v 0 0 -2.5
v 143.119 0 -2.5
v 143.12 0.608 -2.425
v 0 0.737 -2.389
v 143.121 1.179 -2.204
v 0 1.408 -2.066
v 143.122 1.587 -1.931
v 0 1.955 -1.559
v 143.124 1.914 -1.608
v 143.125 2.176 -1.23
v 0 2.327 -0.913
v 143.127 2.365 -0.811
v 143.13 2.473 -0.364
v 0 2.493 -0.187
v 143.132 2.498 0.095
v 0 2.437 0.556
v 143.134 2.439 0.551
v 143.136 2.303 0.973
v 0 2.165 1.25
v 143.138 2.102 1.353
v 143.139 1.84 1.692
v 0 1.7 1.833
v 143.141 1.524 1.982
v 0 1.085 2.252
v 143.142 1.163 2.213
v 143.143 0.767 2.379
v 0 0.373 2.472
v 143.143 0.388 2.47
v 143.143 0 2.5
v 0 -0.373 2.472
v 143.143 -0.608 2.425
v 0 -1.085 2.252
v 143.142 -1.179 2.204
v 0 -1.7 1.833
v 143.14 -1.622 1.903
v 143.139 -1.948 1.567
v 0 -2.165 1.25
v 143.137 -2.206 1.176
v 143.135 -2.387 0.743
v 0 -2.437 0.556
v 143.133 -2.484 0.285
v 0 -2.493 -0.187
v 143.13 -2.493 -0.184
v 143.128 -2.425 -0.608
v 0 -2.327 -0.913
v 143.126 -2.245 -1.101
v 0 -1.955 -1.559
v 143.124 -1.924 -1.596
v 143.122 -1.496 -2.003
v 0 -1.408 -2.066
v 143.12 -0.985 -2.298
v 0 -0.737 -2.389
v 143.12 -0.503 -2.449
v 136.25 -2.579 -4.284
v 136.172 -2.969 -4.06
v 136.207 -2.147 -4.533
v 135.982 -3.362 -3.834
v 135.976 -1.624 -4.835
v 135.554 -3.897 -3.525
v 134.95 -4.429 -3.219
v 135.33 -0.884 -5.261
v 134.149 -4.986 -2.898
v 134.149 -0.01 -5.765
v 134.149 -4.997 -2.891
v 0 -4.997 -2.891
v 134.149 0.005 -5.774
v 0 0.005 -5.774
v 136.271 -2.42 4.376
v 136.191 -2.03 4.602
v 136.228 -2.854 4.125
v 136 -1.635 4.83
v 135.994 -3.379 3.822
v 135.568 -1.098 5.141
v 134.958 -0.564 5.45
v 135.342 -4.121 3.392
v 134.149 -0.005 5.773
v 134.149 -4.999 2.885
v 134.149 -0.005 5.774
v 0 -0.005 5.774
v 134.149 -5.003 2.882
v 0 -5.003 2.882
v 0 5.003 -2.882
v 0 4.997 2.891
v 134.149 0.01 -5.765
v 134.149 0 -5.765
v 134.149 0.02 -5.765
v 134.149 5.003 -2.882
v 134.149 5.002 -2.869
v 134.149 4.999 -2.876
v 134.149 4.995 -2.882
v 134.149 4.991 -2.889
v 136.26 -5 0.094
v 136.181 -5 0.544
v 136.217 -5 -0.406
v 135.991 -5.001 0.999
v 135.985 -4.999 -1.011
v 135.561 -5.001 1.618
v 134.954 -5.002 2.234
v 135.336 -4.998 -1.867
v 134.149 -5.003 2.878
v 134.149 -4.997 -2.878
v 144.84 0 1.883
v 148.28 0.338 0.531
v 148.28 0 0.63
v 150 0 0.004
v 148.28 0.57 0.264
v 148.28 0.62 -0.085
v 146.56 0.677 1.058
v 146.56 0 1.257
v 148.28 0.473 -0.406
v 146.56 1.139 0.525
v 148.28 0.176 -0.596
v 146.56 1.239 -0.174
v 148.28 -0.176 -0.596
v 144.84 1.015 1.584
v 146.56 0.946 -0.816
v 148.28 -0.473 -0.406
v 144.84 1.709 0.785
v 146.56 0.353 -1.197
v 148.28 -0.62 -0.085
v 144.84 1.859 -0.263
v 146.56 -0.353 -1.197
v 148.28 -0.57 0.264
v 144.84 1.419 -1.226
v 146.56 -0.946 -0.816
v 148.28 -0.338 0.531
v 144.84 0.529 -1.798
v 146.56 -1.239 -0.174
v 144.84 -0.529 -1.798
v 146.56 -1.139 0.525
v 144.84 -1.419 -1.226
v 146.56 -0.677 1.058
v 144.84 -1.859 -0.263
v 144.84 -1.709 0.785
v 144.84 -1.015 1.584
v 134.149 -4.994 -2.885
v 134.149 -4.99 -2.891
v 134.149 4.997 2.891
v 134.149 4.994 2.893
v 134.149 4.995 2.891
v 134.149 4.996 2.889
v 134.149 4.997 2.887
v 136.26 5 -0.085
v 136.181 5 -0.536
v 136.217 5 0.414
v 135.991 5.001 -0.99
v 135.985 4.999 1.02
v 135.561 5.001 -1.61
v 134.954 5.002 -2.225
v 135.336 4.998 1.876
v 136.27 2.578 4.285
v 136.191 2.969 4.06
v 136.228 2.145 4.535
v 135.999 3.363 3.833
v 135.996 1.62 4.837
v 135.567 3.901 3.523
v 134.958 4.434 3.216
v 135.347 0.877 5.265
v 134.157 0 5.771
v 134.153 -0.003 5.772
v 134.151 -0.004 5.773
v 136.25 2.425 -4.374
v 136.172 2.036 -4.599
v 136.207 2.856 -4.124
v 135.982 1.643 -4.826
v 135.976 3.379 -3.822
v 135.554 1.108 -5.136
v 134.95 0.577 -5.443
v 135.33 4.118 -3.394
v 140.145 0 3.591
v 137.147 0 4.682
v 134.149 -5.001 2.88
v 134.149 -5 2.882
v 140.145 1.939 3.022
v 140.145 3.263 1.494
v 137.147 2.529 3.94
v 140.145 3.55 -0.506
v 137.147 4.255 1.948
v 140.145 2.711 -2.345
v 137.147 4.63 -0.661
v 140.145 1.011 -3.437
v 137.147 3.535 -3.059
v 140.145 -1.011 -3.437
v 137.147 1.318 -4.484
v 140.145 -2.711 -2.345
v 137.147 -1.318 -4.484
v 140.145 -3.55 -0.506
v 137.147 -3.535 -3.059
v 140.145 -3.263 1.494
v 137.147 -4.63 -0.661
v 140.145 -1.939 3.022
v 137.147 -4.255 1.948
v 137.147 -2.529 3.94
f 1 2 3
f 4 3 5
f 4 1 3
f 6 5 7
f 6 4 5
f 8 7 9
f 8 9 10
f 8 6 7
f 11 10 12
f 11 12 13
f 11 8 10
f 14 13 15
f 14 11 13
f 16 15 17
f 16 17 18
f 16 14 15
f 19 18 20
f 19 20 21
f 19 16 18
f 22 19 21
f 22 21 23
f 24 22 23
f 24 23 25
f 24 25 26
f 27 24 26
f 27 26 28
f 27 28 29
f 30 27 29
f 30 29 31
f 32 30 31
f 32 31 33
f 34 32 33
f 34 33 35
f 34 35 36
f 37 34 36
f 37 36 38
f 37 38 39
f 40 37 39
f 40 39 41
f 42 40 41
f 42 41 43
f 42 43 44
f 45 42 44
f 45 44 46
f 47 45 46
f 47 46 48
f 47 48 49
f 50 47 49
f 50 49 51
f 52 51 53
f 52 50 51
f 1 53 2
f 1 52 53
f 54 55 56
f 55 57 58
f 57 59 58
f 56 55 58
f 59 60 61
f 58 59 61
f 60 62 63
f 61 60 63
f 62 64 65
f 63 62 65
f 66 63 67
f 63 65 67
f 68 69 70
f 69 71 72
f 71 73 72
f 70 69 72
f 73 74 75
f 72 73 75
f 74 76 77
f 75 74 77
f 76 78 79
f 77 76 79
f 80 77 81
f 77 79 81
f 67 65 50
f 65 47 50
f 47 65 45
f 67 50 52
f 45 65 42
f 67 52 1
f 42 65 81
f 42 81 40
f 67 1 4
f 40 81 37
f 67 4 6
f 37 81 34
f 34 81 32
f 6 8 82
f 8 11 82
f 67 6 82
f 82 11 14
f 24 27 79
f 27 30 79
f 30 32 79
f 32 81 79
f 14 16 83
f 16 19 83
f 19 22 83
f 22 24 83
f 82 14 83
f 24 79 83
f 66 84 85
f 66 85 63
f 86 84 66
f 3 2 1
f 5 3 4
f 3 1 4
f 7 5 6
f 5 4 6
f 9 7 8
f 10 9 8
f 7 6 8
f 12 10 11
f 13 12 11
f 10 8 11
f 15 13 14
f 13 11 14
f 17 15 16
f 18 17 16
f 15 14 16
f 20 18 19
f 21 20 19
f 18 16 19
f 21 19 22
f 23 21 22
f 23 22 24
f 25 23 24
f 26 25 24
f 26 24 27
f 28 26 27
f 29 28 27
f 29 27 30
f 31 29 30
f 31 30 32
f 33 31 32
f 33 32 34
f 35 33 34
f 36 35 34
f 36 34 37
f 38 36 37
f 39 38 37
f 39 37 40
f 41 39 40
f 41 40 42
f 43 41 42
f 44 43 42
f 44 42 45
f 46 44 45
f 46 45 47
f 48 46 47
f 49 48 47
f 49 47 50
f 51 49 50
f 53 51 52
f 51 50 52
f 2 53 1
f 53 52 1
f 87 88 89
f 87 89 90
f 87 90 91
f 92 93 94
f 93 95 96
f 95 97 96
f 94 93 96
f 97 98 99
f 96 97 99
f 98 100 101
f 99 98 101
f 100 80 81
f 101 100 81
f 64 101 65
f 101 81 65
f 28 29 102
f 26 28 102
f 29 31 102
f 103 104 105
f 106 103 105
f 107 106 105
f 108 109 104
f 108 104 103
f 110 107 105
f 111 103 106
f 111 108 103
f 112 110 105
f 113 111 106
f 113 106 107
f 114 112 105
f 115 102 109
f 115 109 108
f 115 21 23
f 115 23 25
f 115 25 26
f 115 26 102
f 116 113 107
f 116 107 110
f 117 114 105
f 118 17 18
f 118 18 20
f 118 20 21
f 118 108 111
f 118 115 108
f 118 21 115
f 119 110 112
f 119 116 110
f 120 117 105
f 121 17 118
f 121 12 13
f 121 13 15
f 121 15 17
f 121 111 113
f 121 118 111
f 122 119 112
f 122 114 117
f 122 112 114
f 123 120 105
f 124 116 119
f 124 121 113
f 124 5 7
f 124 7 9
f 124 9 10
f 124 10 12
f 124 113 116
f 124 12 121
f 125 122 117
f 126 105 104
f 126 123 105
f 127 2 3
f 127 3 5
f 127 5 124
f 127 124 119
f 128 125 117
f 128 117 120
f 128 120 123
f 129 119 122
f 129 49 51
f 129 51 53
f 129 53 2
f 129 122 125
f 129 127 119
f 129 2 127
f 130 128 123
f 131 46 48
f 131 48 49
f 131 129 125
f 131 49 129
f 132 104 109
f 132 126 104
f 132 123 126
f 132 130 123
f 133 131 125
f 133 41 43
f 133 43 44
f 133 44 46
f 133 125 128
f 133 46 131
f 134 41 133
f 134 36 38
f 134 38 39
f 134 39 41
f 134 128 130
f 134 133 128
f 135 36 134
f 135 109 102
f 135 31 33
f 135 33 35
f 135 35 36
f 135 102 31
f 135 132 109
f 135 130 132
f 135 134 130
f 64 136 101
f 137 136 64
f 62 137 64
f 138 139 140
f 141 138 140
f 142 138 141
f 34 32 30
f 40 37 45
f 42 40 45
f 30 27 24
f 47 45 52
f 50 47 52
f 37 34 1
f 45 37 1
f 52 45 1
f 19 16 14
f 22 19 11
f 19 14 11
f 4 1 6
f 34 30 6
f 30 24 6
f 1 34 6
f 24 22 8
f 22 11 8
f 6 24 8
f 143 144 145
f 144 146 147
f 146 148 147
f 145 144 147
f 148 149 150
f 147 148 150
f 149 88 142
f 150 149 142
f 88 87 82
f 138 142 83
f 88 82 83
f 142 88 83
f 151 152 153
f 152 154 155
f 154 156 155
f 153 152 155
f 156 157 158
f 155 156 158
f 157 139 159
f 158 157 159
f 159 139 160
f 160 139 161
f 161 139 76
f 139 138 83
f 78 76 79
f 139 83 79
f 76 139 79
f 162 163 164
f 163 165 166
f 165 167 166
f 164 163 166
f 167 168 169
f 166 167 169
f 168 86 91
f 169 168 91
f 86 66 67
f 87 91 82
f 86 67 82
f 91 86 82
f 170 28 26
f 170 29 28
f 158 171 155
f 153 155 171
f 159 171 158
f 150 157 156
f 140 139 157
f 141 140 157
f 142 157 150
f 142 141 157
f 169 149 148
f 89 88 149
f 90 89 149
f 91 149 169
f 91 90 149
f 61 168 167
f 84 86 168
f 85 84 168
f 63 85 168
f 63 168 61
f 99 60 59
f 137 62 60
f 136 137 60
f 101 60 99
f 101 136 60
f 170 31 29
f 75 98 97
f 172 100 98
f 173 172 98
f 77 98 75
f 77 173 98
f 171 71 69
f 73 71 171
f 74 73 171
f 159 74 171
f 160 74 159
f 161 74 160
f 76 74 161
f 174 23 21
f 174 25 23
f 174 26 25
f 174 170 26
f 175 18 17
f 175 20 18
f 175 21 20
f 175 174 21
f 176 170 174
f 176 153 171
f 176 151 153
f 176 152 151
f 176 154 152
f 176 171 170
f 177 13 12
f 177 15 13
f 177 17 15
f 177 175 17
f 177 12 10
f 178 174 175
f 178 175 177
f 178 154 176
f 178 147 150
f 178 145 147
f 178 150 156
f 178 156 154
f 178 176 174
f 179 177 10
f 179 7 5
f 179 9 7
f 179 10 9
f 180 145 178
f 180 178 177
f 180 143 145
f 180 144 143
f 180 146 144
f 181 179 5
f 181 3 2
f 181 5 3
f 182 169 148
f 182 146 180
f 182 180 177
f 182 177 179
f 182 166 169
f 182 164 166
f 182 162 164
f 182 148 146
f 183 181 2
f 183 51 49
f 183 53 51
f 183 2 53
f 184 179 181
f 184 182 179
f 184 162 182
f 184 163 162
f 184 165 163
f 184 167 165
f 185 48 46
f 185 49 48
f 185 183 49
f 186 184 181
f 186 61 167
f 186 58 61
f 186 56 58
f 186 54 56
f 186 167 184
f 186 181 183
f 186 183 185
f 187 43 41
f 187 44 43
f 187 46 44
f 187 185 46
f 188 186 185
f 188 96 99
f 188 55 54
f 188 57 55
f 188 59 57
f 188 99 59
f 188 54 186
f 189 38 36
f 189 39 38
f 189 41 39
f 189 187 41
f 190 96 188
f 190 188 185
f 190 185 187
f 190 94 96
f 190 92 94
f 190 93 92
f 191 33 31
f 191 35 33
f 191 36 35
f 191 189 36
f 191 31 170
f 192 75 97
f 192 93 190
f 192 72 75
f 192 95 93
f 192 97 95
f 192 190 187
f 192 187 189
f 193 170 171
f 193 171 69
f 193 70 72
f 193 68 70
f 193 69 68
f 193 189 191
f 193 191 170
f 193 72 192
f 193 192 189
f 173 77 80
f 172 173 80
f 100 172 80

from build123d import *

# Parameters (mm, degrees)
SKETCH1_R           = 2.5
BOSS_EXTRUDE1_DEPTH = 150
SKETCH2_R           = 2.5
BOSS_EXTRUDE2_DEPTH = 150


with BuildPart() as part:
    # Sketch1 → Boss-Extrude1 (new body)
    with BuildSketch(Plane.YZ):
        Polygon((5.002510393, -2.882398845), (4.99748582, 2.89110166), (-0.005024572, 5.773500505), (-5.002510393, 2.882398845), (-4.99748582, -2.89110166), (0.005024572, -5.773500505), align=None)
        with Locations(Location((0, 0, 0), (0, 0, 270))):
            Circle(SKETCH1_R, mode=Mode.SUBTRACT)
    extrude(amount=BOSS_EXTRUDE1_DEPTH)


with BuildPart() as body_2:
    # Sketch2 → Boss-Extrude2 (new body)
    with BuildSketch(Plane.YZ):
        with Locations(Location((0, 0, 0), (0, 0, 270))):
            Circle(SKETCH2_R)
    extrude(amount=BOSS_EXTRUDE2_DEPTH)


with BuildPart() as cut_revolve1_tool:
    # Sketch3 → Cut-Revolve1 (revolve)
    with BuildSketch(Plane(origin=(0, 0, 0), x_dir=(-1, 0, 0), z_dir=(0, 1, 0))):
        Polygon((-150, 0.004351407), (-134.149393124, 5.773500505), (-134.149393124, 15.773500505), (-160, 15.773500505), (-160, 0.004351407), align=None)
    revolve(axis=Axis((160, 0, 0.004351407), (-1, 0, 0)))


with BuildPart() as part_1:
    add(part.part)

    # Cut-Revolve1: cut by cut_revolve1_tool
    add(cut_revolve1_tool.part, mode=Mode.SUBTRACT)


with BuildPart() as body_2_1:
    add(body_2.part)

    # Cut-Revolve1: cut by cut_revolve1_tool
    add(cut_revolve1_tool.part, mode=Mode.SUBTRACT)


solid = Compound([part_1.part, body_2_1.part])
